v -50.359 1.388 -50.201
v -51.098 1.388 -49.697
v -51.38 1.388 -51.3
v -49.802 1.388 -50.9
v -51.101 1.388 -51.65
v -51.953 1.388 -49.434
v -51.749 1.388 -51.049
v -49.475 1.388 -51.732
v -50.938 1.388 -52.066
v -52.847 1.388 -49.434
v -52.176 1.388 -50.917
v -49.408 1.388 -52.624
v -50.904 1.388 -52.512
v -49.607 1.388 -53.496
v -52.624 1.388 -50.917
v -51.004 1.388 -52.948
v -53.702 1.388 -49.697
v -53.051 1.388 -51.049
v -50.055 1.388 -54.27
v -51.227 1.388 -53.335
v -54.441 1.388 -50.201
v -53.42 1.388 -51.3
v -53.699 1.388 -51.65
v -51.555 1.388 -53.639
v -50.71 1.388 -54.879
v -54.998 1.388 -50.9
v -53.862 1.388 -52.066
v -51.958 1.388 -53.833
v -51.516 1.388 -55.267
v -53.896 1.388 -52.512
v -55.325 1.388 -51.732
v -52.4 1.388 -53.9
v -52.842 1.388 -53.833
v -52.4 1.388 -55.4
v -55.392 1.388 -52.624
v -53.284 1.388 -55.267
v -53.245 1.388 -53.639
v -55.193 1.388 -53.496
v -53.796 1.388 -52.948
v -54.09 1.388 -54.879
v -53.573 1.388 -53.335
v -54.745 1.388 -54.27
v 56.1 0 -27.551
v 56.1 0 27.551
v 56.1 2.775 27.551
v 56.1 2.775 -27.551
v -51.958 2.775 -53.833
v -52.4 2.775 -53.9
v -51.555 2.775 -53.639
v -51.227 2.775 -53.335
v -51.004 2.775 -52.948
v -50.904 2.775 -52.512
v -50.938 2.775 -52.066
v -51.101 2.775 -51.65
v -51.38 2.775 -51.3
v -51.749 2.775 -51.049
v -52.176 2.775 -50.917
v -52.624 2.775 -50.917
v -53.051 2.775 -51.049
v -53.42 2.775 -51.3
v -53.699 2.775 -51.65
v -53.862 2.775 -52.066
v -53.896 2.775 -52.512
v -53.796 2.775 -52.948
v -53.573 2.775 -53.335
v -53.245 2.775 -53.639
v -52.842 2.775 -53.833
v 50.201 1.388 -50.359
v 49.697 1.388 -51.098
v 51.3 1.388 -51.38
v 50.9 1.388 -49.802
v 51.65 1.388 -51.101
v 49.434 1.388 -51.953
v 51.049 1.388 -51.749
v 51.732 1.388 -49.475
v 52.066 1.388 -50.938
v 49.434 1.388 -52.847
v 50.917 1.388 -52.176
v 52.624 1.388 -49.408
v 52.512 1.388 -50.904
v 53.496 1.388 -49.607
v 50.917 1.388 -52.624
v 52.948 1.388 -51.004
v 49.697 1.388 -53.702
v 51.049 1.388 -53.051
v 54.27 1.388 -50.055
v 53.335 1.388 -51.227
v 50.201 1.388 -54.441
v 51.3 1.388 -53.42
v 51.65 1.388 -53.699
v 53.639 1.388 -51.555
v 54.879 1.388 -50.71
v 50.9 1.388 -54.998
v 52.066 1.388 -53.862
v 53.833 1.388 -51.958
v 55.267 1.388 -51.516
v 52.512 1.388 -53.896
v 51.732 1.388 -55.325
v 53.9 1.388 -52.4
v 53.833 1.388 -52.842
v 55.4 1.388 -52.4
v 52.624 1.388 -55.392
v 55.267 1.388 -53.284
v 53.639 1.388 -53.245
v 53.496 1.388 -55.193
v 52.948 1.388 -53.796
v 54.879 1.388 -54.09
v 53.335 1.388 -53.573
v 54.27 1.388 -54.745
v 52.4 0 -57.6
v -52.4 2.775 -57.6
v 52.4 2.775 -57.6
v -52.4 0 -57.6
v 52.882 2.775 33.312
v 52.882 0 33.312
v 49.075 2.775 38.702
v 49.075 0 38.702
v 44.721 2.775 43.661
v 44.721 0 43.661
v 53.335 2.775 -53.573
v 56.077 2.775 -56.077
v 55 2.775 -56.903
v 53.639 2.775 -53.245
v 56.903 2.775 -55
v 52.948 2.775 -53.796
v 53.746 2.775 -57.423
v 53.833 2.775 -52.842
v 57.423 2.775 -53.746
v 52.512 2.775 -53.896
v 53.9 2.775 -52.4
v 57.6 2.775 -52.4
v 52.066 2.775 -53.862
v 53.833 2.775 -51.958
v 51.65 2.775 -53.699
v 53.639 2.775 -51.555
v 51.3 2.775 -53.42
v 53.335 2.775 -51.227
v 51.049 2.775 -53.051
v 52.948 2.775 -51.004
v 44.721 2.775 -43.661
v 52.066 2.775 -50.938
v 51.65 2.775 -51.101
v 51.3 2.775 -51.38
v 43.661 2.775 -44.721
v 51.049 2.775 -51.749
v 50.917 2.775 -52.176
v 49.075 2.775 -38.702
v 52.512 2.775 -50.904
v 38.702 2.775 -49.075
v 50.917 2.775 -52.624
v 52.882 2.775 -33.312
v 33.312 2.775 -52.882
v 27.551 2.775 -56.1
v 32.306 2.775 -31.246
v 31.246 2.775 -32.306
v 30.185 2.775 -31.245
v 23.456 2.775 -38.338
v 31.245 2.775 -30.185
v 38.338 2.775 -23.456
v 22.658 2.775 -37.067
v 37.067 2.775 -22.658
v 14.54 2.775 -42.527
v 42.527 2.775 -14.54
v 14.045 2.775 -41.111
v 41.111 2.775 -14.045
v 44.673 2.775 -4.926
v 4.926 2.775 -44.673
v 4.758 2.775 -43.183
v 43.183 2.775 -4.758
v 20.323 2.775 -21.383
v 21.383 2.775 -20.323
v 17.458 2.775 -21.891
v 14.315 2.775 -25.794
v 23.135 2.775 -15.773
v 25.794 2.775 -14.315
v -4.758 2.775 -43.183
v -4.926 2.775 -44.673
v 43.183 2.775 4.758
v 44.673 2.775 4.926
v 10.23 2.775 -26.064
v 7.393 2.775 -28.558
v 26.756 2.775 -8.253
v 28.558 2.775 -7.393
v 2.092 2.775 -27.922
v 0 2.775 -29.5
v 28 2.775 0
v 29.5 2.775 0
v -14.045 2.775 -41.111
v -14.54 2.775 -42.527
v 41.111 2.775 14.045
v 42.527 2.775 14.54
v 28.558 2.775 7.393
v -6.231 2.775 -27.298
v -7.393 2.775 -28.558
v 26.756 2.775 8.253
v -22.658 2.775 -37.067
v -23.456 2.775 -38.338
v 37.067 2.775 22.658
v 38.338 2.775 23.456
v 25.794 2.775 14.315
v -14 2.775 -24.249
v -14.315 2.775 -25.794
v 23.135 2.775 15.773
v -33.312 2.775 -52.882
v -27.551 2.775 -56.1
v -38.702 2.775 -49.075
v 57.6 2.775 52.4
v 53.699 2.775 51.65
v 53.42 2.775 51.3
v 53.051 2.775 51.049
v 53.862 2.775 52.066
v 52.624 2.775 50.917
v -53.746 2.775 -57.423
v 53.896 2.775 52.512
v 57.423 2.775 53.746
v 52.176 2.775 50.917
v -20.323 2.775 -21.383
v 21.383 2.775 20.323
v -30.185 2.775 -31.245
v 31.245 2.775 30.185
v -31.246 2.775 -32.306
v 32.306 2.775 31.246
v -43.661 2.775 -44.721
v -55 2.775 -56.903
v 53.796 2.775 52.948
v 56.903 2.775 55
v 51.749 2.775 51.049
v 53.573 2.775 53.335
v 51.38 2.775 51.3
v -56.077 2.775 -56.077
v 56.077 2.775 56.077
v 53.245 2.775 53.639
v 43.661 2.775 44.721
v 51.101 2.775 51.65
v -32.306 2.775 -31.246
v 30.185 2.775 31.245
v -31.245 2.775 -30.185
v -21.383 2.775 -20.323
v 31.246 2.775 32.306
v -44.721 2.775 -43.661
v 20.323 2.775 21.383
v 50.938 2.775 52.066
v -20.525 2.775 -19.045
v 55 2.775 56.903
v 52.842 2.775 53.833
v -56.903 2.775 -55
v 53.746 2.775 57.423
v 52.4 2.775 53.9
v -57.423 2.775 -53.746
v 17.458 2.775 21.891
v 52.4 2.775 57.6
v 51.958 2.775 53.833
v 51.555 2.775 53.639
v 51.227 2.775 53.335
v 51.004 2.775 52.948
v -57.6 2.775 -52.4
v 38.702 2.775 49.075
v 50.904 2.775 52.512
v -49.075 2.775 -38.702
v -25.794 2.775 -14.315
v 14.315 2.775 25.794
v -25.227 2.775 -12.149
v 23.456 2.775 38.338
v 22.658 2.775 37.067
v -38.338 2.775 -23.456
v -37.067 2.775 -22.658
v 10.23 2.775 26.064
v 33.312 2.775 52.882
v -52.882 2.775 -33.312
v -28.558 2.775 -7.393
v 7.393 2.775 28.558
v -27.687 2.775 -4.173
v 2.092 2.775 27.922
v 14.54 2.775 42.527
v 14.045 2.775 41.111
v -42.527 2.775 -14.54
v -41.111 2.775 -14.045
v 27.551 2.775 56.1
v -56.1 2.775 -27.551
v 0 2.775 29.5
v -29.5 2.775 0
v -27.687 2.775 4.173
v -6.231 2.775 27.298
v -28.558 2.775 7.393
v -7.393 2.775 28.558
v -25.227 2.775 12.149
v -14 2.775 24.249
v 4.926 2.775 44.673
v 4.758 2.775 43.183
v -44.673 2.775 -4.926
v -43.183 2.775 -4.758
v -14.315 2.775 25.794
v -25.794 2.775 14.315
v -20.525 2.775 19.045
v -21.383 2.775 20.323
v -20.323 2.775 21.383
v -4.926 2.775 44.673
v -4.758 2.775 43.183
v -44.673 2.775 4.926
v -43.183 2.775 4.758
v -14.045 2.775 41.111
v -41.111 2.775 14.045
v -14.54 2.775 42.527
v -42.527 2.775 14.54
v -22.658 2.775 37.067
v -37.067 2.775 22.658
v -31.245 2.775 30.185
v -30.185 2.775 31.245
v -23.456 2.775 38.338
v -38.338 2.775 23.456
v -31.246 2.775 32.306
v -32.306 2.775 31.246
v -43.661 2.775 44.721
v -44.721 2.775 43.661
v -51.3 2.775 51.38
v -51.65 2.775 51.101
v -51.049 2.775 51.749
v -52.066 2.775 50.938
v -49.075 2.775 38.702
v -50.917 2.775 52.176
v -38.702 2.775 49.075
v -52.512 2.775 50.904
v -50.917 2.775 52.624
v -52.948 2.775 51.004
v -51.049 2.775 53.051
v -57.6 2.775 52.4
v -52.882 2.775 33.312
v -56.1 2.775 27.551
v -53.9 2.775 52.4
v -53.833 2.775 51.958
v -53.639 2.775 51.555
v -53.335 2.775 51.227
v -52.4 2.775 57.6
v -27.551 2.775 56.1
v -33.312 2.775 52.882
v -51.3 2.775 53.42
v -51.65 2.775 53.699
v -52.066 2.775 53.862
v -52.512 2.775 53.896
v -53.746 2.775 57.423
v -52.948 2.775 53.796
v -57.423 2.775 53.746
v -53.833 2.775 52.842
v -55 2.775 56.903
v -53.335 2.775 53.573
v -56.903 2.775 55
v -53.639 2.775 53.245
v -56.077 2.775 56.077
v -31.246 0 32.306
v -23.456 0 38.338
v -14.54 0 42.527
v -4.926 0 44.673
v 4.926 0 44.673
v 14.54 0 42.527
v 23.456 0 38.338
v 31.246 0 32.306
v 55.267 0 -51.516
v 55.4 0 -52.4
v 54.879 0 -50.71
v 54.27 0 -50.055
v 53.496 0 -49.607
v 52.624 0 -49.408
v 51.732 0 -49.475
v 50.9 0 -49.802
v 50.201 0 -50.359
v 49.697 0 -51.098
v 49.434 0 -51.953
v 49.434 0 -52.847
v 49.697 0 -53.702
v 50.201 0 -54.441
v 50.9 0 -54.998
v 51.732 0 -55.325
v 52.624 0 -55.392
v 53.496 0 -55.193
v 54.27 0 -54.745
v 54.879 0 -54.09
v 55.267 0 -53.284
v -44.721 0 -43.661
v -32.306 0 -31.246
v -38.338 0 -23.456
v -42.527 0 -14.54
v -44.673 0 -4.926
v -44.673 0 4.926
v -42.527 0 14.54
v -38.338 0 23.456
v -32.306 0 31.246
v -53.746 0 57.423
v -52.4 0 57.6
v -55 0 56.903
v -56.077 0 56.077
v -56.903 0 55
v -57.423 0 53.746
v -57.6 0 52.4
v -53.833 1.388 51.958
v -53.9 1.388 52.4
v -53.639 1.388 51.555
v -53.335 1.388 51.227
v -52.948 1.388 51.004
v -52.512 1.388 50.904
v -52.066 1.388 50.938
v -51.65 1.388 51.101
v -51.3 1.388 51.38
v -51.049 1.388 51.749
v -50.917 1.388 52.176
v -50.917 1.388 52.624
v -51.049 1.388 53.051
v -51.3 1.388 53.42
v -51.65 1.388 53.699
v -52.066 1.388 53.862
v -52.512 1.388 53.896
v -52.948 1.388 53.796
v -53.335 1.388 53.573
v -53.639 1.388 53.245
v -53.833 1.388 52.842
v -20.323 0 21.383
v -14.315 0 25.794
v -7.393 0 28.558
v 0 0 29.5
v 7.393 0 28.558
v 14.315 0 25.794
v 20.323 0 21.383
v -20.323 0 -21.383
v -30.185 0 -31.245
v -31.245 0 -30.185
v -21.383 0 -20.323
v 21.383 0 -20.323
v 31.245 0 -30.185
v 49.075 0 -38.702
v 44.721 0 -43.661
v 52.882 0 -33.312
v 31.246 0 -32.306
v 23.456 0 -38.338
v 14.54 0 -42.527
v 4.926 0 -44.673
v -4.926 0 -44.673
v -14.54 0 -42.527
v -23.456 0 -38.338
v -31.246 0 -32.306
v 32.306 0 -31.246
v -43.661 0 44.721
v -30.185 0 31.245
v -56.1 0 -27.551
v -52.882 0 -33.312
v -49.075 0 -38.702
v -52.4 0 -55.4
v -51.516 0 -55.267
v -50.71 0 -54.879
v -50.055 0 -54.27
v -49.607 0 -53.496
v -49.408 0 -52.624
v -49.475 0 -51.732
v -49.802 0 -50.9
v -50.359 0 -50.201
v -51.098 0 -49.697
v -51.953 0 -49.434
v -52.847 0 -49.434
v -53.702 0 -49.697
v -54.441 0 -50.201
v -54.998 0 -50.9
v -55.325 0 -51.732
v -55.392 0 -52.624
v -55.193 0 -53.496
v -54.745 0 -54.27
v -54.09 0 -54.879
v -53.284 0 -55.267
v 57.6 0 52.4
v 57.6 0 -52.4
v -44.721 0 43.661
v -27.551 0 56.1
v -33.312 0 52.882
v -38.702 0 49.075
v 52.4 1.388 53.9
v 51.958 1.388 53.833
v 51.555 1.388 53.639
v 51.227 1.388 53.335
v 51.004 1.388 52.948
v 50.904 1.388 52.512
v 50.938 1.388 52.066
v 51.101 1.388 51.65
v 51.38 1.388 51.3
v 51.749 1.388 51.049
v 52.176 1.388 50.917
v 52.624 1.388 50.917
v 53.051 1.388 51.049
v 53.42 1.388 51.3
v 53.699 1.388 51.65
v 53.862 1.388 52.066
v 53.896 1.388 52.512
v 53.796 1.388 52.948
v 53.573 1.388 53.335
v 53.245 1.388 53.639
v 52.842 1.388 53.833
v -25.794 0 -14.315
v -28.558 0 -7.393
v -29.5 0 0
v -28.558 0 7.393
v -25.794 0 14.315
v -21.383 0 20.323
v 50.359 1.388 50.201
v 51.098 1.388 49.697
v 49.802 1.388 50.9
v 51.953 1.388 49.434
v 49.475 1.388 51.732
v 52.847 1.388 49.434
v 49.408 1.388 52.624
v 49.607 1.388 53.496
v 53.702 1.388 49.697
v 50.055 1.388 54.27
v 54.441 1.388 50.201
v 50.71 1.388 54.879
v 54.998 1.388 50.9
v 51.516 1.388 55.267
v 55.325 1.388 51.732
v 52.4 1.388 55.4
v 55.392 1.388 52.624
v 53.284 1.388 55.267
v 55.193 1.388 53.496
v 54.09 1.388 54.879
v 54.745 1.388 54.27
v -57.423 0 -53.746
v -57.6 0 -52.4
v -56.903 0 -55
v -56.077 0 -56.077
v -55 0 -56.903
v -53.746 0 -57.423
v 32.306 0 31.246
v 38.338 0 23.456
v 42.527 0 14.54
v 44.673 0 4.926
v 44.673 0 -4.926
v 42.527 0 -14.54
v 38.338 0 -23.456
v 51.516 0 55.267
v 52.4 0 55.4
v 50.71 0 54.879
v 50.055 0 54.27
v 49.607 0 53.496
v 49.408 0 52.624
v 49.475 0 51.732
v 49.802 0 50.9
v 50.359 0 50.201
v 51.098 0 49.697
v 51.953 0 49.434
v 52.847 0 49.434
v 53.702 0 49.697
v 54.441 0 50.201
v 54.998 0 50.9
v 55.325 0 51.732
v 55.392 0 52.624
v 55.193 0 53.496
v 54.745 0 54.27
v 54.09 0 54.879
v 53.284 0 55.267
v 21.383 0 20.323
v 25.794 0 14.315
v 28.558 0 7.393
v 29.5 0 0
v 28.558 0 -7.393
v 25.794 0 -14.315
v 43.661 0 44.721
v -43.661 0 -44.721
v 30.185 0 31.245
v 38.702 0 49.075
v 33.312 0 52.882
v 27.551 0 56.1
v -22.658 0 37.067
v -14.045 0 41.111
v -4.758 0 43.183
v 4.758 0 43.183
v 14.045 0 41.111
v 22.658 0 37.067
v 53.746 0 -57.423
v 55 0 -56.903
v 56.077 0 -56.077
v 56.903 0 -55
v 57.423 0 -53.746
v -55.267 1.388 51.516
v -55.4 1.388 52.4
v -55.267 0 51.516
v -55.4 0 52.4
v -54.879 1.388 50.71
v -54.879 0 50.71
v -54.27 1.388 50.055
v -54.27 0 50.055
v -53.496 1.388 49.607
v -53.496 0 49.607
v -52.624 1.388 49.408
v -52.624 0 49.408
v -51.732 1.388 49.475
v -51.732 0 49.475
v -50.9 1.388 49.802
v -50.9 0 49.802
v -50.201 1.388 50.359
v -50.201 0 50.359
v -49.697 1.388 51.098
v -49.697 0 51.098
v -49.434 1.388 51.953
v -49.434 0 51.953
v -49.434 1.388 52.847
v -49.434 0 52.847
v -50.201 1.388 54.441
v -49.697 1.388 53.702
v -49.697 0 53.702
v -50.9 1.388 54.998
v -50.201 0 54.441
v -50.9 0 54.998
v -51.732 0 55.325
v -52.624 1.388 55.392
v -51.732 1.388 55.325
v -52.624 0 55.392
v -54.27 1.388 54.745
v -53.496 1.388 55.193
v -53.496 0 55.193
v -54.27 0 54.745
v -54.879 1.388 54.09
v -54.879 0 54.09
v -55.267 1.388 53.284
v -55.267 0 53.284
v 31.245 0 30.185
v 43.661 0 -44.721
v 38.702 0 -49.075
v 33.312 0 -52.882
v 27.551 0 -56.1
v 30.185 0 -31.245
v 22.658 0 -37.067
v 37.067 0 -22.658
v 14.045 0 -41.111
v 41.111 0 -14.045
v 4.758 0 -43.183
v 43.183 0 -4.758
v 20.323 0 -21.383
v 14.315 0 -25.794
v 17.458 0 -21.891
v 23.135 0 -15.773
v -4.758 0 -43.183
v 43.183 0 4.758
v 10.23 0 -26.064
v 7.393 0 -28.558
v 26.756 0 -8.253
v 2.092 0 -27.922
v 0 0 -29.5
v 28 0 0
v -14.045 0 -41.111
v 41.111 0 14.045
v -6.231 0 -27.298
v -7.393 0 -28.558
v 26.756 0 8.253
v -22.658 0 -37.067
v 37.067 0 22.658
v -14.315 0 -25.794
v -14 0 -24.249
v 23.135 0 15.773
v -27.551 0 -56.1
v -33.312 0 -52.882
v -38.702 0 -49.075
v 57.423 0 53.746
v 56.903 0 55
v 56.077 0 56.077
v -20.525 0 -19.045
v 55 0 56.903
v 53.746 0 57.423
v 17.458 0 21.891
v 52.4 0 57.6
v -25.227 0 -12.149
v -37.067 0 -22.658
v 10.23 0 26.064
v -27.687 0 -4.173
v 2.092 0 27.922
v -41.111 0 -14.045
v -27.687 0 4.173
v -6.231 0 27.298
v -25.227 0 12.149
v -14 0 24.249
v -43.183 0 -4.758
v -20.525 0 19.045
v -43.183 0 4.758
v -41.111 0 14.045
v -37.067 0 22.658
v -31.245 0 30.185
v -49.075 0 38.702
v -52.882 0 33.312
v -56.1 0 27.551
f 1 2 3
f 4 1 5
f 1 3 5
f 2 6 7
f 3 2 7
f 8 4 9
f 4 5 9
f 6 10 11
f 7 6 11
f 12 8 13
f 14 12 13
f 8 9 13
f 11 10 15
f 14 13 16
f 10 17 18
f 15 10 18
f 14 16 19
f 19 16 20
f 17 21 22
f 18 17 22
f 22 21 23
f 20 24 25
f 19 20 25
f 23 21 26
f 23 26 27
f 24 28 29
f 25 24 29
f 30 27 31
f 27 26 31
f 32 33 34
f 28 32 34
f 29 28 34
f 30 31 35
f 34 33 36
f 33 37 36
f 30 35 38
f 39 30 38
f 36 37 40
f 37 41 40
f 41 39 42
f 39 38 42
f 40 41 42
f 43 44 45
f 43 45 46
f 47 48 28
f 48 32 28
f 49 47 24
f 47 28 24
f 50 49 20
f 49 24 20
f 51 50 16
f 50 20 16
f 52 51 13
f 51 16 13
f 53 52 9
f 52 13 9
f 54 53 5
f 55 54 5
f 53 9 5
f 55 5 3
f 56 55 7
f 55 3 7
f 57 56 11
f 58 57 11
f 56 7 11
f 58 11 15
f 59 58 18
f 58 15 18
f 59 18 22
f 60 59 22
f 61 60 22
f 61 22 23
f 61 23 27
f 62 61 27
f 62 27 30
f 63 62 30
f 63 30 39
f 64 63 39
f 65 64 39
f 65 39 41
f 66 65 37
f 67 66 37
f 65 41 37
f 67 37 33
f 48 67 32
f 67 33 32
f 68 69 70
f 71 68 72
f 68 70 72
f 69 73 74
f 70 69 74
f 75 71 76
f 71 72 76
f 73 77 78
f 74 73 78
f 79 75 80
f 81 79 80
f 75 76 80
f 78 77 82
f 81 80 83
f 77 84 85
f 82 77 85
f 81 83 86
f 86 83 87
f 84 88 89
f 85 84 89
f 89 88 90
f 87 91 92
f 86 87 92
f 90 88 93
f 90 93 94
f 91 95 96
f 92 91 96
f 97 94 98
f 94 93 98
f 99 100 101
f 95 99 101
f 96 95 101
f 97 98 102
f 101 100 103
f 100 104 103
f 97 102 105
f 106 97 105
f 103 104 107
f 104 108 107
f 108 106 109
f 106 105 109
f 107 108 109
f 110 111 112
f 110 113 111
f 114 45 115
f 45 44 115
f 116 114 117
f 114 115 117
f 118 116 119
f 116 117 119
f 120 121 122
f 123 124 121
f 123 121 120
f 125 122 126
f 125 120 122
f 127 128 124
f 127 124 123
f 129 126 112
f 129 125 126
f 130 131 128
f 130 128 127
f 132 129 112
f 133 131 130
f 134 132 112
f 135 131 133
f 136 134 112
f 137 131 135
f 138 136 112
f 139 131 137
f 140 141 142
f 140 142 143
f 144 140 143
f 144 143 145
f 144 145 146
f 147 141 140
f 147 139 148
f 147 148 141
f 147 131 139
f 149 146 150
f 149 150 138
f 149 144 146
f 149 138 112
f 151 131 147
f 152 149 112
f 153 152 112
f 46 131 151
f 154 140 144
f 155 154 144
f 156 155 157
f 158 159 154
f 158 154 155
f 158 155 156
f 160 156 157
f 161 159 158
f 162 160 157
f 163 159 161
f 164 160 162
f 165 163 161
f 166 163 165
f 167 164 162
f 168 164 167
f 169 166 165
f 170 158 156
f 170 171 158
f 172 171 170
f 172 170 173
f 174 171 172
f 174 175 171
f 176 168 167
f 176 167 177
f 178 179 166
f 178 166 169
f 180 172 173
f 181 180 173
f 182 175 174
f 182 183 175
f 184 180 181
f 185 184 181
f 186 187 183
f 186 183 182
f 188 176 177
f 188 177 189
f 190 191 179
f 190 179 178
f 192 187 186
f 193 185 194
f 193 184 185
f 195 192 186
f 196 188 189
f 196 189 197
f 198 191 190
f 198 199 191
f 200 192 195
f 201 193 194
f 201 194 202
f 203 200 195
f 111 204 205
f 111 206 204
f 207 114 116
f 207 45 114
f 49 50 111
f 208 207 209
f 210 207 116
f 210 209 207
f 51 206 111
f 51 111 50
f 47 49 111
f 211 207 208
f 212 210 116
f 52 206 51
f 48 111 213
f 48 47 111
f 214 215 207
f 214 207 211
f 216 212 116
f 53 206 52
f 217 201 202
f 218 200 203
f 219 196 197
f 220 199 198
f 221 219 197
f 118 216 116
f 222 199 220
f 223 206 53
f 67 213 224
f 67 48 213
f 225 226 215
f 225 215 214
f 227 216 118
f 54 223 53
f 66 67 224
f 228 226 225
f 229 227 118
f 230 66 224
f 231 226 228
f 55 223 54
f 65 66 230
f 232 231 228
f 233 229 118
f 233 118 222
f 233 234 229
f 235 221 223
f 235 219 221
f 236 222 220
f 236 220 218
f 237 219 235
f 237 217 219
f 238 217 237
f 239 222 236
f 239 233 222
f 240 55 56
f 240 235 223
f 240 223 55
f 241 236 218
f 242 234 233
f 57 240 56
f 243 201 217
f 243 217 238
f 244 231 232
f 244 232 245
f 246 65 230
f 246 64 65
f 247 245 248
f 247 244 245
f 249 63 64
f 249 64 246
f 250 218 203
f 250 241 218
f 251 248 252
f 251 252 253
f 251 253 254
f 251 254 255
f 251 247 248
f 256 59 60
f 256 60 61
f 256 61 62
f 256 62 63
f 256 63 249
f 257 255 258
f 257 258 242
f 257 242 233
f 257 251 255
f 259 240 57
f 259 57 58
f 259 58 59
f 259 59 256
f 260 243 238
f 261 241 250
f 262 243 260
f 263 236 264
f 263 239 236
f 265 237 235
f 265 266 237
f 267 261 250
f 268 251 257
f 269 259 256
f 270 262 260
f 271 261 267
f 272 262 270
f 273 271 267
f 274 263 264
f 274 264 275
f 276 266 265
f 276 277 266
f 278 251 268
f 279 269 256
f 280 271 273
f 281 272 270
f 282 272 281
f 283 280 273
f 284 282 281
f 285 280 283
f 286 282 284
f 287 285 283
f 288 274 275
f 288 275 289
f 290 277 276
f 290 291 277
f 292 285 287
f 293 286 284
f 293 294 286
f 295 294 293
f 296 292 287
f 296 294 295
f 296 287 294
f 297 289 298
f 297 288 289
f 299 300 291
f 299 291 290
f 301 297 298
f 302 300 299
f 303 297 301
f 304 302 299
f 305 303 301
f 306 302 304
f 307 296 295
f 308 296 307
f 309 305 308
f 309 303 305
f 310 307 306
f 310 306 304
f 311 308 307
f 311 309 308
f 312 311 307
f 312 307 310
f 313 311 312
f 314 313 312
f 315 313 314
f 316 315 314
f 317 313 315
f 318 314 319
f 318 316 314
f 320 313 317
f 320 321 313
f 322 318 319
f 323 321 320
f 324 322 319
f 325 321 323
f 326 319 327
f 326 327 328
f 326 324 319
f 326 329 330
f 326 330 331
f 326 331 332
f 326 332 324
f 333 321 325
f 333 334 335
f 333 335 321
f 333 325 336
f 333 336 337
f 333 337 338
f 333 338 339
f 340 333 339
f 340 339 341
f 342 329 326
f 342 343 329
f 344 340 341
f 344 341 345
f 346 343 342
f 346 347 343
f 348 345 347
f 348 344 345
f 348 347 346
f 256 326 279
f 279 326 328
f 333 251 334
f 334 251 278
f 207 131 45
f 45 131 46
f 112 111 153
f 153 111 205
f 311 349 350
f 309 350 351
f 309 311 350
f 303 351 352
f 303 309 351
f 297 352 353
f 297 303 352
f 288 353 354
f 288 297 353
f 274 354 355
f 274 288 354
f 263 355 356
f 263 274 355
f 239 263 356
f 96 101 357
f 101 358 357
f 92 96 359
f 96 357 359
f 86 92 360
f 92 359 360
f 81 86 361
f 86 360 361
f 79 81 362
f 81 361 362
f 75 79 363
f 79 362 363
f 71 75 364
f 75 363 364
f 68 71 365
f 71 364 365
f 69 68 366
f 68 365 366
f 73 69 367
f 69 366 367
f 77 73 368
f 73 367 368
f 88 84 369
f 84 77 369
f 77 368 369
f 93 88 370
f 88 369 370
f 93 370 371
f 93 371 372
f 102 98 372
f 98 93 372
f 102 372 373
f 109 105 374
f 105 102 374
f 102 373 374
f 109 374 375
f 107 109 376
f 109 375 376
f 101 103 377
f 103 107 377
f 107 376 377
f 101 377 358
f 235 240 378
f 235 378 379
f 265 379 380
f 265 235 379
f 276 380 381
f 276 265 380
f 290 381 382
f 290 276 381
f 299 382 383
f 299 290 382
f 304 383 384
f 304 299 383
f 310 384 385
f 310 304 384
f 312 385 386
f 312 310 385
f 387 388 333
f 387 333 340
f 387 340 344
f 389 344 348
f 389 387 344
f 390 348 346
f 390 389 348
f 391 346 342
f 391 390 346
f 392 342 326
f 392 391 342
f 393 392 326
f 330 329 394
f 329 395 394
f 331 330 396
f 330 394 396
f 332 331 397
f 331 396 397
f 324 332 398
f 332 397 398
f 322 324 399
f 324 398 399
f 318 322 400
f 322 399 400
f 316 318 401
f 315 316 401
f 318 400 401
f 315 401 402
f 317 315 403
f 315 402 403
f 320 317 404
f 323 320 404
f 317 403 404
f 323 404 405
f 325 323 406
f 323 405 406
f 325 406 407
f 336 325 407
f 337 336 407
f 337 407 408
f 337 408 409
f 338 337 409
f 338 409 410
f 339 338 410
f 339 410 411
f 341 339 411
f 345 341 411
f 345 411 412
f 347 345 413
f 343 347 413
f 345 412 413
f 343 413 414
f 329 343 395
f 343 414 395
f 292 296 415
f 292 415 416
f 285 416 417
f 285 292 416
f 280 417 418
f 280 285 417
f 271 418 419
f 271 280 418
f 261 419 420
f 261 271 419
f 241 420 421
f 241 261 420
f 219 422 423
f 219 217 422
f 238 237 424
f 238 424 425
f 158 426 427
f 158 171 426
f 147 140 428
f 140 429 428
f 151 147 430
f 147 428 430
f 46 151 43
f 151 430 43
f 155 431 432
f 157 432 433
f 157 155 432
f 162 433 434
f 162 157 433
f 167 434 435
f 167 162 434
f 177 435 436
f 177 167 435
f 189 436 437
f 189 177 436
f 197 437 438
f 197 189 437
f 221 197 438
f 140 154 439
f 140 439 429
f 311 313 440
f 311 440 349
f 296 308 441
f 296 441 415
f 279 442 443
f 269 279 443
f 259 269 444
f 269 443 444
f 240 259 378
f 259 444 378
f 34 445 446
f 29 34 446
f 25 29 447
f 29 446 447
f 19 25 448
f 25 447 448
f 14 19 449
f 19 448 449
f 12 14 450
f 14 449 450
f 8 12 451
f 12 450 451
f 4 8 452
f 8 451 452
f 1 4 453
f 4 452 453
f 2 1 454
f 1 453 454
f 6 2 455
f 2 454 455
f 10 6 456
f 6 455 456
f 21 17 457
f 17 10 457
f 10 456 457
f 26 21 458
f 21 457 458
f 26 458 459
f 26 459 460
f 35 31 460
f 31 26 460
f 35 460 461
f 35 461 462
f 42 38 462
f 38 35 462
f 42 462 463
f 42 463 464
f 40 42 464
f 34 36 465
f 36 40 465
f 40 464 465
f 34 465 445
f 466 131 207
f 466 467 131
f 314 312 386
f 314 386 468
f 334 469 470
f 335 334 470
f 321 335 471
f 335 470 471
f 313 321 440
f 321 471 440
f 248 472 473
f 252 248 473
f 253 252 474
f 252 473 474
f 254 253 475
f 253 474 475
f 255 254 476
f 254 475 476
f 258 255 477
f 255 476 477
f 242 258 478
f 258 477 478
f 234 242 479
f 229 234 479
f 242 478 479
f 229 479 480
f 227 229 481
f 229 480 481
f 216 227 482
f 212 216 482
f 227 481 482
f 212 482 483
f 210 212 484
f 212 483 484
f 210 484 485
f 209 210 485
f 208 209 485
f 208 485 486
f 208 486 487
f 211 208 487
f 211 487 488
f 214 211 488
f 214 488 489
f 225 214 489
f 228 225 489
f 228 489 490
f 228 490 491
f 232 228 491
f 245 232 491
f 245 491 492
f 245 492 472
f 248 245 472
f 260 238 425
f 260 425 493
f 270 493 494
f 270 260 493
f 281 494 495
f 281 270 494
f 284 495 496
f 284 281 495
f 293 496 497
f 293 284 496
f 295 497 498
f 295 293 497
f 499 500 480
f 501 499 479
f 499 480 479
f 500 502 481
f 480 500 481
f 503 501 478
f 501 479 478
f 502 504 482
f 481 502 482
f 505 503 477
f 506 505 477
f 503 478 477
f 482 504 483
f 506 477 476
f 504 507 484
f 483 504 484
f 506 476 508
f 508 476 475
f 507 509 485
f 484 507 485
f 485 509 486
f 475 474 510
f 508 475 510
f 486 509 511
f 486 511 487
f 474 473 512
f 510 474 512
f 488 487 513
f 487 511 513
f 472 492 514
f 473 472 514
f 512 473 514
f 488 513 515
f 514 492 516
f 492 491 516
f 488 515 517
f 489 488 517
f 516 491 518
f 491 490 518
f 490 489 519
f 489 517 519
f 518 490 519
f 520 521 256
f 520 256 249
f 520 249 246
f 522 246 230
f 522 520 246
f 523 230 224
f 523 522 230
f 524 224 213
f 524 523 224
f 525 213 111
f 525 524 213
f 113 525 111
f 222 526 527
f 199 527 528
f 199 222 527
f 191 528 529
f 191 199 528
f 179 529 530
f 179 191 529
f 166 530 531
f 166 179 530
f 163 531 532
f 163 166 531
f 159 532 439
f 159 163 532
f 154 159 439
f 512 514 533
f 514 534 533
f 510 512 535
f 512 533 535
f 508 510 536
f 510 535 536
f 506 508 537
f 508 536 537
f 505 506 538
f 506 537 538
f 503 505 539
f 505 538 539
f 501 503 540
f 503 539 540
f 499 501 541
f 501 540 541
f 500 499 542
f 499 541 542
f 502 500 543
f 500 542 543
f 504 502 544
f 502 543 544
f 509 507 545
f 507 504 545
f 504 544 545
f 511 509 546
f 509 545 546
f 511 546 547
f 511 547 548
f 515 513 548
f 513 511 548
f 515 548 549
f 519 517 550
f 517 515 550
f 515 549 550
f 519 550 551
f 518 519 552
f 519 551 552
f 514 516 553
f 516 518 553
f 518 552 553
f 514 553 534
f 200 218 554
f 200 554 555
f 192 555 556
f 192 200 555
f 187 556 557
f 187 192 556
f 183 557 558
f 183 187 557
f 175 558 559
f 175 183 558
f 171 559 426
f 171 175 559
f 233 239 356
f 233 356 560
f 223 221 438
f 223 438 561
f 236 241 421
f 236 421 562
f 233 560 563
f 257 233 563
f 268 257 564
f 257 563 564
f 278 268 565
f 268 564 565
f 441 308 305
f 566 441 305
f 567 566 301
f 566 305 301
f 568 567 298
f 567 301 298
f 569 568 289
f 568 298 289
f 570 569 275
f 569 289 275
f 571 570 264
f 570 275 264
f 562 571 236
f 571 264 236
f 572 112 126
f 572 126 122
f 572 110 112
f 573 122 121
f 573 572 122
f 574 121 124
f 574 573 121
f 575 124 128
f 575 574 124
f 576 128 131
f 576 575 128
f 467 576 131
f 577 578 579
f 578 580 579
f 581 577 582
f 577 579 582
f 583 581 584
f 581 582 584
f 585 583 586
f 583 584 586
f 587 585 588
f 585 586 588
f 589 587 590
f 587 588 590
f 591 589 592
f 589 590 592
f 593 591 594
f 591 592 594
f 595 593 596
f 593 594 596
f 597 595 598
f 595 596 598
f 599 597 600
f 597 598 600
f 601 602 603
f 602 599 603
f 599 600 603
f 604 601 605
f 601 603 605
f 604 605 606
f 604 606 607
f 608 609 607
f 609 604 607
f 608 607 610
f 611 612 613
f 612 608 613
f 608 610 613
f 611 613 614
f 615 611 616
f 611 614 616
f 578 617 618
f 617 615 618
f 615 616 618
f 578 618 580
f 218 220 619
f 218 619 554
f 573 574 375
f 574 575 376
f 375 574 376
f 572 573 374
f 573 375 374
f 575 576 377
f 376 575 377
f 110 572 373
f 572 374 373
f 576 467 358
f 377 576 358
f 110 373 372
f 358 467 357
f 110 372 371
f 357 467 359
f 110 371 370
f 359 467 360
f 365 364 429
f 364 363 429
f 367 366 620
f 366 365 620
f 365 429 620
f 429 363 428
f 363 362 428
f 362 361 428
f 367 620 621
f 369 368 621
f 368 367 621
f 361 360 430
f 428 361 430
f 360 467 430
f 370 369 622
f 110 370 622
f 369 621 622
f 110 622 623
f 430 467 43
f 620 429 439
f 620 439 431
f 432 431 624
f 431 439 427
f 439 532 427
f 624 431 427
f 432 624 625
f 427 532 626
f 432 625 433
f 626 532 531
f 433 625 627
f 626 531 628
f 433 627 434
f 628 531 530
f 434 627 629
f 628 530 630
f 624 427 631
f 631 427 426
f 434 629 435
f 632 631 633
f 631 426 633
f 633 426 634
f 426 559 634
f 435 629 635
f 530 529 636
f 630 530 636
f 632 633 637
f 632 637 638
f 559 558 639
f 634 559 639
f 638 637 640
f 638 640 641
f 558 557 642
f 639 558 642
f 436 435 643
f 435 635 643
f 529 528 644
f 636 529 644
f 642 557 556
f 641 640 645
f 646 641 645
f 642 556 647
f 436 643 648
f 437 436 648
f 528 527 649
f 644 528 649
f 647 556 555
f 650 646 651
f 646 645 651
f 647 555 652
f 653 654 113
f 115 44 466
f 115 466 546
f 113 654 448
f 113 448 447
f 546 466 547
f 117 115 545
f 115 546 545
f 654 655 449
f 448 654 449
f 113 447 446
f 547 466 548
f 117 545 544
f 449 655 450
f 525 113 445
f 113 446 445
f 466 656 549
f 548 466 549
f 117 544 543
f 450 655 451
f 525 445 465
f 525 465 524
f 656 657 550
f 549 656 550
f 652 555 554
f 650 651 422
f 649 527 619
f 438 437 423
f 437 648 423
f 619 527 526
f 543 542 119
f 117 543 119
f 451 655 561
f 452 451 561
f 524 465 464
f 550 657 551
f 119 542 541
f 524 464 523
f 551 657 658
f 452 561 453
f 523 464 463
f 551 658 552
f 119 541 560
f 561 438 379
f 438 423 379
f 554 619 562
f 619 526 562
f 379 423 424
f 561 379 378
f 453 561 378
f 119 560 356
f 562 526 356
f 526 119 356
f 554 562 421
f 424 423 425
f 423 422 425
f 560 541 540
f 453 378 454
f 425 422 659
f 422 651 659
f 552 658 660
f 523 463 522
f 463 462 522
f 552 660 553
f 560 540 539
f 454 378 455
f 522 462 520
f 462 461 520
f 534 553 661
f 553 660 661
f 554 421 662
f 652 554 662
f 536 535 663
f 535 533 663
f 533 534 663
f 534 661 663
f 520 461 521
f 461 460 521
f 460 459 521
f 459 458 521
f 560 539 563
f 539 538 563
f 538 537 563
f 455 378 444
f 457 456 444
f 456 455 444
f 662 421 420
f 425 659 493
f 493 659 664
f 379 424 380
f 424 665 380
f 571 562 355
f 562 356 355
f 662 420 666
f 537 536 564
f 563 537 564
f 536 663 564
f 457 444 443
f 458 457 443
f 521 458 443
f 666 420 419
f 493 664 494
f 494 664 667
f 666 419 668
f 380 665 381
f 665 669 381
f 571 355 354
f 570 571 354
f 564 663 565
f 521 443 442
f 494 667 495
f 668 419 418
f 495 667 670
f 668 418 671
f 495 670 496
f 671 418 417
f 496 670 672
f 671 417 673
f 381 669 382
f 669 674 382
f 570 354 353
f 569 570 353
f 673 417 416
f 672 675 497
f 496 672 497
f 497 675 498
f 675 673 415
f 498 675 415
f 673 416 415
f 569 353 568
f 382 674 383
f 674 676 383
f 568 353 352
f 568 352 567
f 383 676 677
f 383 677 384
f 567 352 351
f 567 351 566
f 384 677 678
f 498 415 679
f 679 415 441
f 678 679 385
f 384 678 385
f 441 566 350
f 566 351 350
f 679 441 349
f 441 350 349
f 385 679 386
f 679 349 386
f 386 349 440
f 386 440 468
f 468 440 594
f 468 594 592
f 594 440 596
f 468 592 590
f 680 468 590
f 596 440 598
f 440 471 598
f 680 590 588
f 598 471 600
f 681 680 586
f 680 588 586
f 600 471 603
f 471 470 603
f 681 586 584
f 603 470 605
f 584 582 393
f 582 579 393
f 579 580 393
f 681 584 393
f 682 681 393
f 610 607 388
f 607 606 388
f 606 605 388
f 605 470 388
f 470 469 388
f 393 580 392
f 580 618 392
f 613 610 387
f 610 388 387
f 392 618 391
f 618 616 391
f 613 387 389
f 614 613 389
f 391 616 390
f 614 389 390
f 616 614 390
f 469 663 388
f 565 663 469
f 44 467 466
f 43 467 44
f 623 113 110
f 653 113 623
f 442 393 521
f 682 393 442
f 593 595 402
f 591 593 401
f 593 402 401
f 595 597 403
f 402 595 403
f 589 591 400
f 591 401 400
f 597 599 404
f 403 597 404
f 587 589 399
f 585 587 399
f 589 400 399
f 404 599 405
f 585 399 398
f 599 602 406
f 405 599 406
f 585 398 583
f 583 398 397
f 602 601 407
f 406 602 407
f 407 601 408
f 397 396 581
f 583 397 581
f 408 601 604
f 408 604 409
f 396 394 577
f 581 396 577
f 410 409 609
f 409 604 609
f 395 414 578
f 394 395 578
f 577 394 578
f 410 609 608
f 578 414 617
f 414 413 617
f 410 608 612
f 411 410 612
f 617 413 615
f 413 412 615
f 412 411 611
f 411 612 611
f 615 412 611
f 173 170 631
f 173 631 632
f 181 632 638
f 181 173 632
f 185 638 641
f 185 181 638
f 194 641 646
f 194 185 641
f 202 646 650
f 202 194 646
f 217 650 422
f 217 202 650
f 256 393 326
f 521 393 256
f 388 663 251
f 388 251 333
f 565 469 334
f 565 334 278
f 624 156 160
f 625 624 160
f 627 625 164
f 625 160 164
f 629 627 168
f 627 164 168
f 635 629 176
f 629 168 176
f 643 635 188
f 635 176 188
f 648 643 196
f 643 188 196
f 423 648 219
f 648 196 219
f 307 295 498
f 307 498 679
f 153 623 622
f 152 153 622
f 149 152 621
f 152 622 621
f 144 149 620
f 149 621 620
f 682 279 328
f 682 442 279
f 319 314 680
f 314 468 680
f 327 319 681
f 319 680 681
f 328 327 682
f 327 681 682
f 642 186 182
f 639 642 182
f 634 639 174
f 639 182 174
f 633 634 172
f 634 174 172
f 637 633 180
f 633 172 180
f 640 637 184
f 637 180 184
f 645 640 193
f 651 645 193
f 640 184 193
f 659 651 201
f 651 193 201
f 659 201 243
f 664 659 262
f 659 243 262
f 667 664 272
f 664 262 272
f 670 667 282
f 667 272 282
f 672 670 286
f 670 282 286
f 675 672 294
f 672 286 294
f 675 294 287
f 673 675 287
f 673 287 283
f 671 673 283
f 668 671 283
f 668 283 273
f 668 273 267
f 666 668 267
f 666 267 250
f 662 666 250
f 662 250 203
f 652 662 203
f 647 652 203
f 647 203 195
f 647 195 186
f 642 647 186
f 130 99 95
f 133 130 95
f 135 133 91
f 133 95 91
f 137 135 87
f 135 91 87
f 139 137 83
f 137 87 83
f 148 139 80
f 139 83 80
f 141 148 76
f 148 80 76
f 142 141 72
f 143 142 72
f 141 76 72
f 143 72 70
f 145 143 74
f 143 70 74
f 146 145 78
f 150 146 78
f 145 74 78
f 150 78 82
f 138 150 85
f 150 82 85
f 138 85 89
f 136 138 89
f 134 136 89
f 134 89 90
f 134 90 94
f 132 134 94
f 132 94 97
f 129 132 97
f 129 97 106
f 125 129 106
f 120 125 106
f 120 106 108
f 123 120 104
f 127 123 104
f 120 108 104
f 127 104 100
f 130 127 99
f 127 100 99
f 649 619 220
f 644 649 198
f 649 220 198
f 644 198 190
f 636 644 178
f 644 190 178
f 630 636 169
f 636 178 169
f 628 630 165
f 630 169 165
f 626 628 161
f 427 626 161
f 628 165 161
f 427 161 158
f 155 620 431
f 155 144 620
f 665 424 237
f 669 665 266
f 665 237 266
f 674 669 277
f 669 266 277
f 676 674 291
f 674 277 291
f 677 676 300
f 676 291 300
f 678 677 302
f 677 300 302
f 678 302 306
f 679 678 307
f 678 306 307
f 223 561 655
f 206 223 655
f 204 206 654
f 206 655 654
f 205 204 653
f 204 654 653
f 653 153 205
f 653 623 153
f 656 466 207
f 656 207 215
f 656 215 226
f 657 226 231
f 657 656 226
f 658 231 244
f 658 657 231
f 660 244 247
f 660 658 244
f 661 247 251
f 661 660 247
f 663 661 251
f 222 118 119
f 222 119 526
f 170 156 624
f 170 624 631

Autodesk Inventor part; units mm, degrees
ref_plane "YZ Plane" through (0, 0, 0) normal (1, 0, 0) x (0, 1, 0)
ref_plane "XZ Plane" through (0, 0, 0) normal (0, 1, 0) x (-1, 0, 0)
ref_plane "XY Plane" through (0, 0, 0) normal (0, 0, 1) x (1, 0, 0)
sketch "Sketch1" plane through (0, 0, 0) normal (0, 1, 0) x (-1, 0, 0)
  line L0 (-57.6, 57.6) -> (57.6, 57.6)
  line L1 (57.6, 57.6) -> (57.6, -57.6)
  line L2 (57.6, -57.6) -> (-57.6, -57.6)
  line L3 (-57.6, -57.6) -> (-57.6, 57.6)
  line L4 (-57.6, 57.6) -> (57.6, -57.6) construction
  line L5 (57.6, 57.6) -> (-57.6, -57.6) construction
  circle A0 centre (52.4, 52.4) radius 1.5
  circle A1 centre (52.4, -52.4) radius 1.5
  arc A2 (56.1, 27.5507) -> (27.5507, 56.1) centre (0, 0) ccw
  arc A3 (27.5507, -56.1) -> (56.1, -27.5507) centre (0, 0) ccw
  arc A4 (-56.1, -27.5507) -> (-27.5507, -56.1) centre (0, 0) ccw
  arc A5 (-27.5507, 56.1) -> (-56.1, 27.5507) centre (0, 0) ccw
  line L6 (27.5507, 56.1) -> (-27.5507, 56.1)
  line L7 (-56.1, 27.5507) -> (-56.1, -27.5507)
  line L8 (-27.5507, -56.1) -> (27.5507, -56.1)
  line L9 (56.1, -27.5507) -> (56.1, 27.5507)
  arc A6 (57.6, 52.4) -> (52.4, 57.6) centre (52.4, 52.4) ccw
  line L10 (47.7863, 57.6) -> (44.1942, 44.1942)
  line L11 (44.1942, 44.1942) -> (57.6, 47.7863)
  line L12 (-58, 58) -> (58, 58) construction
  line L13 (58, 58) -> (58, -58) construction
  line L14 (58, -58) -> (-58, -58) construction
  line L15 (-58, -58) -> (-58, 58) construction
  line L16 (-58, 58) -> (58, -58) construction
  line L17 (58, 58) -> (-58, -58) construction
  circle A7 centre (52.4, 52.4) radius 3
  point P0 (0, 56.1)
  dimension "d1" = 3
  dimension "d2" = 104.8
  dimension "d4" = 62.5
  dimension "d9" = 30
  dimension "d80" = 116
  dimension "d81" = 0.4
  dimension "d82" = 1.5
  dimension "d88" = 6
extrude "Extrusion3" add sketch "Sketch1" along normal blind 2.775 contours L0 L10 L11 L1 L2 L3 | L0 A6 L1 L11 L10 | L0 L1 A6 | A0 | A1 | A7
extrude "Extrusion5" cut sketch "Sketch1" along normal up to next contours L0 L1 A6
sketch "Sketch4" plane through (0, 2.775, 0) normal (0, 1, 0) x (1, 0, 0)
  line L0 (-56.1, -27.5507) -> (-56.1, 27.5507) projected
  arc A0 (-27.5507, 56.1) -> (-56.1, 27.5507) centre (0, 0) ccw projected
  line L1 (-27.5507, 56.1) -> (27.5507, 56.1) projected
  arc A1 (56.1, 27.5507) -> (27.5507, 56.1) centre (0, 0) ccw projected
  line L2 (56.1, 27.5507) -> (56.1, -27.5507) projected
  arc A2 (27.5507, -56.1) -> (56.1, -27.5507) centre (0, 0) ccw projected
  line L3 (27.5507, -56.1) -> (-27.5507, -56.1) projected
  arc A3 (-56.1, -27.5507) -> (-27.5507, -56.1) centre (0, 0) ccw projected
  line L4 (-57.6, 57.6) -> (-57.6, -52.4) projected
  arc A4 (-57.6, -52.4) -> (-52.4, -57.6) centre (-52.4, -52.4) ccw projected
  line L5 (-52.4, -57.6) -> (57.6, -57.6) projected
  line L6 (57.6, -57.6) -> (57.6, 57.6) projected
  line L7 (57.6, 57.6) -> (-57.6, 57.6) projected
  circle A5 centre (0, 0) radius 28
  circle A6 centre (0, 0) radius 29.5
  line L8 (52.4, 52.4) -> (-52.4, -52.4) construction
  line L9 (-21.3832, -20.3226) -> (-44.7213, -43.6607)
  line L10 (-43.6607, -44.7213) -> (-20.3226, -21.3832)
  arc A7 (-52.4, 56.1) -> (-56.1, 52.4) centre (-52.4, 52.4) ccw
  line L11 (-56.1, 52.4) -> (-56.1, -52.4)
  arc A8 (-56.1, -52.4) -> (-52.4, -56.1) centre (-52.4, -52.4) ccw
  line L12 (-52.4, -56.1) -> (52.4, -56.1)
  arc A9 (52.4, -56.1) -> (56.1, -52.4) centre (52.4, -52.4) ccw
  line L13 (56.1, -52.4) -> (56.1, 52.4)
  arc A10 (56.1, 52.4) -> (52.4, 56.1) centre (52.4, 52.4) ccw
  line L14 (52.4, 56.1) -> (-52.4, 56.1)
  arc A11 (-52.4, 55.2) -> (-55.2, 52.4) centre (-52.4, 52.4) ccw
  line L15 (-55.2, 52.4) -> (-55.2, -52.4)
  arc A12 (-55.2, -52.4) -> (-52.4, -55.2) centre (-52.4, -52.4) ccw
  line L16 (-52.4, -55.2) -> (52.4, -55.2)
  arc A13 (52.4, -55.2) -> (55.2, -52.4) centre (52.4, -52.4) ccw
  line L17 (55.2, -52.4) -> (55.2, 52.4)
  arc A14 (55.2, 52.4) -> (52.4, 55.2) centre (52.4, 52.4) ccw
  line L18 (52.4, 55.2) -> (-52.4, 55.2)
  arc A15 (-56.1, -27.5507) -> (-27.5507, -56.1) centre (0, 0) ccw projected
  arc A16 (-55.2, -29.3123) -> (-29.3123, -55.2) centre (0, 0) ccw
  circle A17 centre (0, 0) radius 44.1942 construction
  line L19 (0, 44.1942) -> (44.1942, 44.1942) construction
  circle A18 centre (0, 0) radius 44.9442
  circle A19 centre (0, 0) radius 43.4442
  point P0 (0, 0)
  dimension "d36" = 56
  dimension "d37" = 1.5
  dimension "d38" = 1.5
  dimension "d48" = 0.9
  dimension "d69" = 1.5
  dimension "d70" = 0.75
extrude "Extrusion12" add sketch "Sketch4" against normal blind 2.775 contours A18 L10 A19 L9 | L9 A19 L10 A18 | A6
extrude "Extrusion13" add sketch "Sketch4" against normal blind 2.775 contours L9 A18 L10 A3 | L9 A19 L10 A18 | L9 A6 L10 A19 picked at (-30.6576, -31.4825) picked at (-23.7298, -24.5548)
extrude "Extrusion15" cut sketch "Sketch1" along normal up to next contours A0
extrude "Extrusion16" cut sketch "Sketch1" along normal blind 1.3875 contours A7
pattern_circular "Circular Pattern8" count 4 over 360 about axis through (0, 2.775, 0) along (0, -1, 0) of "Extrusion15", "Extrusion16", "Extrusion13", "Extrusion5"
equation "\"d1\" = holeSize"
equation "\"d2\" = dHoles"
equation "\"d4\" = 0.5 * fanDia"
equation "\"d82\" = d39"
equation "\"d22\" = thickness"
equation "\"d36\" = fanCenter"
equation "\"d37\" = d39"
equation "\"d38\" = d39"
equation "\"d69\" = d39"
equation "\"d70\" = 0.5 * d39"
equation "\"d62\" = thickness"
equation "\"d64\" = thickness"
equation "\"d89\" = 0.5 * thickness"
equation "\"holeSize\" = 3"
equation "\"thickness\" = 2.775"
equation "\"dHoles\" = 104.8"
equation "\"fanDia\" = 125"
equation "\"d39\" = 1.5"
equation "\"fanCenter\" = 56"
properties part number "intake2"
